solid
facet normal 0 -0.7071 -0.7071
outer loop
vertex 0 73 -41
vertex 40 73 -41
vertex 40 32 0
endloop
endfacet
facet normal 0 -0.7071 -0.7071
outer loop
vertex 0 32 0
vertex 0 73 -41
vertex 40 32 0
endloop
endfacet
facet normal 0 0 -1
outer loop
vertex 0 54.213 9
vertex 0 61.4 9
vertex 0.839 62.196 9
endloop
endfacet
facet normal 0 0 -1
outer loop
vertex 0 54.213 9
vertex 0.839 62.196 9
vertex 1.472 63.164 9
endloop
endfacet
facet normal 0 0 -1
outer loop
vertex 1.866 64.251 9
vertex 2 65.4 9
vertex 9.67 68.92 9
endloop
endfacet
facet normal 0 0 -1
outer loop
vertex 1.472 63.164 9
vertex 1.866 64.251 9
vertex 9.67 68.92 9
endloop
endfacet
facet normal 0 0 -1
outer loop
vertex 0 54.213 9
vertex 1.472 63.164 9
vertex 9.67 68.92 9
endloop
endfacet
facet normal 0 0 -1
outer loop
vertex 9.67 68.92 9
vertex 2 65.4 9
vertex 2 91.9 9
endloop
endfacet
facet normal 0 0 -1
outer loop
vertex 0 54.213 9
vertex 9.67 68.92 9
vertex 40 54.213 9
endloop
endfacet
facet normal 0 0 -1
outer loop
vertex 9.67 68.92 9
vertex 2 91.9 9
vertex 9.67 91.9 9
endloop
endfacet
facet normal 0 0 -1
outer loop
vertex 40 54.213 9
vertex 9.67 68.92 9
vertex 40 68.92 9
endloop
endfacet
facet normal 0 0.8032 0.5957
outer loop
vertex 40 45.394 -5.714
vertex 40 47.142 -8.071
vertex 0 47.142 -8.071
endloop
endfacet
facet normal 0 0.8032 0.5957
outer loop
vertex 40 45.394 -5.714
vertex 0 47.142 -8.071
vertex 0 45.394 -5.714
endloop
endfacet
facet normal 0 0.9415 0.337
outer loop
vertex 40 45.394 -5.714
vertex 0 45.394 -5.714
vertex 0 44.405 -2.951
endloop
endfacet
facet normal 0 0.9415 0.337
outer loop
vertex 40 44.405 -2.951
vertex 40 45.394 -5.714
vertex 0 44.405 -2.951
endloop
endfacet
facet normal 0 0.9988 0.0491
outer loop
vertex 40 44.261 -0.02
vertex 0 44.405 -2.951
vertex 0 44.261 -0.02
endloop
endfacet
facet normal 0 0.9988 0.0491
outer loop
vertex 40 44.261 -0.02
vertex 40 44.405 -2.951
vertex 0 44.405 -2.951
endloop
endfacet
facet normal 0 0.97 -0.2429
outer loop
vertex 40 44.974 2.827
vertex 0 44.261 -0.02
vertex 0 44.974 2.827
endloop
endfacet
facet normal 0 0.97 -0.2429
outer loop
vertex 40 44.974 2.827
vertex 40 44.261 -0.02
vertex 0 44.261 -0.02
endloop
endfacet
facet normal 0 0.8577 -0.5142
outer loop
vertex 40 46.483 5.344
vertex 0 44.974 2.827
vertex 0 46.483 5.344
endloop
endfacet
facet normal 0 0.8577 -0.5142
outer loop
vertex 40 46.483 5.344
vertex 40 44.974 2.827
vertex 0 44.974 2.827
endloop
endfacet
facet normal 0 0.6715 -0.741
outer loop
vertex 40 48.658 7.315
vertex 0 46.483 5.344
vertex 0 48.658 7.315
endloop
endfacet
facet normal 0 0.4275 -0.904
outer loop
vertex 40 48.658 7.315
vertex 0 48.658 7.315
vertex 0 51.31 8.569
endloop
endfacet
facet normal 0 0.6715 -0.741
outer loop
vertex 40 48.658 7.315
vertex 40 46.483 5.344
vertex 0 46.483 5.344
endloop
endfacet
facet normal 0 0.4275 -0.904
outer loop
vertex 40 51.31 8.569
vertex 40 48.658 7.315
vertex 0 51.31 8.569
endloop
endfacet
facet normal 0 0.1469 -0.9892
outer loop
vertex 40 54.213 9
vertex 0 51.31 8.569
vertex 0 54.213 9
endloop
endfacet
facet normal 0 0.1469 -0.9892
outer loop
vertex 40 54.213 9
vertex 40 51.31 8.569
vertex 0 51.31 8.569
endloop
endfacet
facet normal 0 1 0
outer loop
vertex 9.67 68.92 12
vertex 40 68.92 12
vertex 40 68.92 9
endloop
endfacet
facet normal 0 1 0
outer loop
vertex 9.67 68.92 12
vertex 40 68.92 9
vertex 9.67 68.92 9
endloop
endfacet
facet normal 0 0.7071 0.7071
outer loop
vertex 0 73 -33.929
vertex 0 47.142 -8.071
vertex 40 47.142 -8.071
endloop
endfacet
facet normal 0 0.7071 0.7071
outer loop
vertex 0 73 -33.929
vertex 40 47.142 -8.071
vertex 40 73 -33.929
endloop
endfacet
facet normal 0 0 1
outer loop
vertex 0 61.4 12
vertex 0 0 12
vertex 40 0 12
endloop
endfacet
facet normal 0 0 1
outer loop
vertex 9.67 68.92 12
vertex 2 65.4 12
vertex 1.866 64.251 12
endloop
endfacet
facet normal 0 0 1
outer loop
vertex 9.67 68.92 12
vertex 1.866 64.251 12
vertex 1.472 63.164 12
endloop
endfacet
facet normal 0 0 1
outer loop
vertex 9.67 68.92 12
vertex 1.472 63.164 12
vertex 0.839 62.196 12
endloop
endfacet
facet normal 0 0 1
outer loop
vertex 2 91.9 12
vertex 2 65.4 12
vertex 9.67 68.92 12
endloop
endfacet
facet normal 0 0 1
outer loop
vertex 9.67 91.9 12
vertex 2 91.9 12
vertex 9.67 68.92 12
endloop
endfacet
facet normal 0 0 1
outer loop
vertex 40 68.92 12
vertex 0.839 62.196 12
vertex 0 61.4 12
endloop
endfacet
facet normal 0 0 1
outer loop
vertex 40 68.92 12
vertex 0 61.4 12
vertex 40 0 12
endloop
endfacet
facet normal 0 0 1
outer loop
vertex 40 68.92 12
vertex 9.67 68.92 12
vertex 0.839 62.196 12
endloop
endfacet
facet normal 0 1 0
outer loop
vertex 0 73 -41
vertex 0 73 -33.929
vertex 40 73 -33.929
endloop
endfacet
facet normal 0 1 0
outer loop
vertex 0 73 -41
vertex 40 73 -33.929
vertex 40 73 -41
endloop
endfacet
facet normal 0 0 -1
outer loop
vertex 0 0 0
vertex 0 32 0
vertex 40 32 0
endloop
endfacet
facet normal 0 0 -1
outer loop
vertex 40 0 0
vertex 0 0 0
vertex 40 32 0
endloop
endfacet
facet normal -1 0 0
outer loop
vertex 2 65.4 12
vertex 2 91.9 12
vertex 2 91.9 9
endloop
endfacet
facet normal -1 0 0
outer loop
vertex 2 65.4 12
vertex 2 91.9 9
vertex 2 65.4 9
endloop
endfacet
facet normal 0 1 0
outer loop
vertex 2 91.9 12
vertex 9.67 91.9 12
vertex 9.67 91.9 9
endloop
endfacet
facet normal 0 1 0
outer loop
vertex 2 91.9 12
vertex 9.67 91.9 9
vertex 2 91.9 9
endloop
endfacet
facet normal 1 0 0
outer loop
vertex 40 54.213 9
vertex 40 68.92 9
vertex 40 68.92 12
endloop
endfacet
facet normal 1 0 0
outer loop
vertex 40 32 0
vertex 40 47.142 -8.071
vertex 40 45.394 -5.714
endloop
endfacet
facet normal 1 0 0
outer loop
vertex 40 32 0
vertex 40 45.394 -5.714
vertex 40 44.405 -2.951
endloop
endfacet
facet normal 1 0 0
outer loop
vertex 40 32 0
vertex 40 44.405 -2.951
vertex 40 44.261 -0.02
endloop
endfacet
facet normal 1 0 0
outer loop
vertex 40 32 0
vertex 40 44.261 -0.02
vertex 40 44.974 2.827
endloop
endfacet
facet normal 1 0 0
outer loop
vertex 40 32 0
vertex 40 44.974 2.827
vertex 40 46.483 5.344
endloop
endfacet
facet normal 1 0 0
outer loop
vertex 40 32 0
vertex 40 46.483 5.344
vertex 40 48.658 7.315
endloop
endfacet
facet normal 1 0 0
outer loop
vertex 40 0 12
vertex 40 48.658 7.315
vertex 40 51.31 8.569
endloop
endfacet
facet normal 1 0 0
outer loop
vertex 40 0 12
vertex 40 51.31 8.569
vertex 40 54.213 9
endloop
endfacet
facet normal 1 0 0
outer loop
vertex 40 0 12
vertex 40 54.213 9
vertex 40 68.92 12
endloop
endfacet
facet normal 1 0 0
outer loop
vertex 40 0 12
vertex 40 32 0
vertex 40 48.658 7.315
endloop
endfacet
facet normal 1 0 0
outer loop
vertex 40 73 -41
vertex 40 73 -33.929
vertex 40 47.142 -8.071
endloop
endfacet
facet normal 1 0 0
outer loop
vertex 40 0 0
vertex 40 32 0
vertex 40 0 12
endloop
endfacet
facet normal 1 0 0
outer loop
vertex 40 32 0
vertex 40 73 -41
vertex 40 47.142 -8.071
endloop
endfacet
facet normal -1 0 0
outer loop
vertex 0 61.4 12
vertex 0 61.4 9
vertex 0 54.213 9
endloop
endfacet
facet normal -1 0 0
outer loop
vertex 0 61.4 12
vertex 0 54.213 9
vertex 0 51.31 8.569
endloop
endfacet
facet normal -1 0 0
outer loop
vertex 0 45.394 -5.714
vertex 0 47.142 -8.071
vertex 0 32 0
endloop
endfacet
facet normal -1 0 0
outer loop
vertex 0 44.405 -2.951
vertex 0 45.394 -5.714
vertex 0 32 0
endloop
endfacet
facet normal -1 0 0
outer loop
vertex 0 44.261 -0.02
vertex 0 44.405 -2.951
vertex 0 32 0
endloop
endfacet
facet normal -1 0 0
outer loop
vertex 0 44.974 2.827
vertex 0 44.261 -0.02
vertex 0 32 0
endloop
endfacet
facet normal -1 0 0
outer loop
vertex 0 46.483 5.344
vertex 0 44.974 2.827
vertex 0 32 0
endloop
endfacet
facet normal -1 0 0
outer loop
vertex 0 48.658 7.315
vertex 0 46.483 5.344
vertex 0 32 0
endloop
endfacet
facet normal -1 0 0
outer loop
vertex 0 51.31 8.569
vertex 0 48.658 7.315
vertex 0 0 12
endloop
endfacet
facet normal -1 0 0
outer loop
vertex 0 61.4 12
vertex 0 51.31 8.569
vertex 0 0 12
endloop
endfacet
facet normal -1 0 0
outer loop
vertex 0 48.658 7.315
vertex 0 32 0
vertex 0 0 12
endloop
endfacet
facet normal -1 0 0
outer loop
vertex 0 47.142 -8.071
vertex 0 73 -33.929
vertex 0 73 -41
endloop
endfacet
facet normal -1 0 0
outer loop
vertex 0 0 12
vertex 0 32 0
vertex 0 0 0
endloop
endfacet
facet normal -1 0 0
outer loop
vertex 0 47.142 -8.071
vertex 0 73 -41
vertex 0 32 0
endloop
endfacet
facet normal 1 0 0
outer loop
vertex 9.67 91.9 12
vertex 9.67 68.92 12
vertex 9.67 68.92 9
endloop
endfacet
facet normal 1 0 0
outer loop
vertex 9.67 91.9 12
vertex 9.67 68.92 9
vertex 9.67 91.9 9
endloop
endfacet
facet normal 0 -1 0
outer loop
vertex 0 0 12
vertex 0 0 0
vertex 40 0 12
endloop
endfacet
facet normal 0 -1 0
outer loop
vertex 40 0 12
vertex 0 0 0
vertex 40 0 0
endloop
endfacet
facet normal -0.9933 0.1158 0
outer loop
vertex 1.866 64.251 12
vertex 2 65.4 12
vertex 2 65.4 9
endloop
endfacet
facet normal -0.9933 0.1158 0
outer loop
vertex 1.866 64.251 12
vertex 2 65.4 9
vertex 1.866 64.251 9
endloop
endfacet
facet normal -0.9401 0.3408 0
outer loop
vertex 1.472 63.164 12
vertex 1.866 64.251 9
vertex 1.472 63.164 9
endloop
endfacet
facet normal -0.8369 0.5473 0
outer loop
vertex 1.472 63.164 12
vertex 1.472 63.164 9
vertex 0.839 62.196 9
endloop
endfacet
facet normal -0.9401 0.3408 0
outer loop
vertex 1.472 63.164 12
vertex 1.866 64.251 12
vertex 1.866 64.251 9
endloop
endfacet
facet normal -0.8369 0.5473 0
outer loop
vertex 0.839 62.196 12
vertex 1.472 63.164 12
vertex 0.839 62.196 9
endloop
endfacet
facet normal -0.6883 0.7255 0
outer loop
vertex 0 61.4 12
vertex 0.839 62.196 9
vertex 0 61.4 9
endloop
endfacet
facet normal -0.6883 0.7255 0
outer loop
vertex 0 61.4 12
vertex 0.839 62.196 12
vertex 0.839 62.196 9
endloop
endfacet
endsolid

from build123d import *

# Parameters (mm, degrees)
SKETCH_1_W          = 40
SKETCH_1_H          = 32
EXTRUDE_1_DEPTH     = 12
EXTRUDE_2_DEPTH     = 3
FILLET_1_R          = 10
EXTRUDE_3_DEPTH     = 40
FILLET_2_R          = 10
CUT_EXTRUDE_4_DEPTH = 106.156697477
EXTRUDE_4_DEPTH     = 10
EXTRUDE_5_DEPTH     = 10
EXTRUDE_6_DEPTH     = 10
EXTRUDE_7_DEPTH     = 10
FILLET_3_R          = 3
EXTRUDE_8_DEPTH     = 3
SKETCH_11_W         = 29.594040462
SKETCH_11_H         = 15.509477318
CUT_EXTRUDE_5_DEPTH = 125.135450215


with BuildPart() as part:
    # Эскиз1 → Бобышка-Вытянуть1 (new body)
    with BuildSketch(Plane.XY):
        with Locations((20, 16)):
            Rectangle(SKETCH_1_W, SKETCH_1_H)
    extrude(amount=EXTRUDE_1_DEPTH)

    # Эскиз2 → Бобышка-Вытянуть2 (add)
    with BuildSketch(Plane.XY.offset(12)):
        Polygon((40, 68.92), (9.67, 68.92), (9.67, 61.4), (0, 61.4), (0, 32), (9.67, 32), (40, 32), align=None)
    extrude(amount=-EXTRUDE_2_DEPTH)

    # Скругление1
    # the kernel refuses this fillet: 10 mm, written as the material it adds along each edge
    with BuildSketch(Plane(origin=(0, 32, 9), x_dir=(0, 1, 0), z_dir=(1, 0, 0))) as fillet_1_piece_1:
        with BuildLine():
            CenterArc((9.949874371, -10), FILLET_1_R, 90, 84.260829523)
            Line((0, -9), (-0.198997487, -8.98))
            ThreePointArc((-0.198997487, -8.98), (-0.2, -4.5), (-0.2, 0))
            Line((-0.2, 0), (0, 0.2))
            Line((0, 0.2), (9.949874371, 0.2))
            Line((9.949874371, 0.2), (9.949874371, 0))
        make_face()
    extrude(amount=40)

    # Эскиз3 → Бобышка-Вытянуть3 (add)
    with BuildSketch(Plane.ZY):
        Polygon((-50, 82), (0, 32), (0.953231177, 30.366676535), (6.580561568, 32.490506244), (-44.343145751, 83.414213562), align=None)
    extrude(amount=-EXTRUDE_3_DEPTH)

    # Скругление2
    # the kernel refuses this fillet: 10 mm, written as the material it adds along each edge
    with BuildSketch(Plane(origin=(40, 34.002081727, 5.068986084), x_dir=(0, 0.9816056191455192, 0.19091990064406986), z_dir=(-1, 0, 0))) as fillet_2_piece_1:
        with BuildLine():
            CenterArc((18.680660418, 9.816056191), FILLET_2_R, 146.006473408, 135)
            Line((10.389652956, 15.407048525), (9.56055221, 15.966147758))
            Line((9.56055221, 15.966147758), (-0.829100746, 0.559099233))
            Line((-0.829100746, 0.559099233), (-0.66429077, -0.747474262))
            ThreePointArc((-0.66429077, -0.747474262), (8.743026606, -3.322919186), (20.780779325, -0.981605619))
            Line((20.780779325, -0.981605619), (20.589859424, 0))
        make_face()
    extrude(amount=40)

    # Эскиз5 → Вырез-Вытянуть4 (cut, through all)
    with BuildSketch(Plane(origin=(40, 0, 0), x_dir=(0, 0, -1), z_dir=(1, 0, 0))):
        Polygon((50, 82), (39.176517875, 82), (40.76887279, 85.052981815), (48.441128294, 85.535513608), align=None)
    extrude(amount=-CUT_EXTRUDE_4_DEPTH, mode=Mode.SUBTRACT)

    # Эскиз6 → Бобышка-Вытянуть4 (add)
    with BuildSketch(Plane(origin=(40, 0, 0), x_dir=(0, 0, -1), z_dir=(1, 0, 0))):
        Polygon((34.928932188, 74), (42, 74), (50, 82), (42.928932188, 82), align=None)
    extrude(amount=EXTRUDE_4_DEPTH)

    # Эскиз7 → Бобышка-Вытянуть5 (add)
    with BuildSketch(Plane.ZY):
        Polygon((-42, 74), (-34.928932188, 74), (-42.928932188, 82), (-50, 82), align=None)
    extrude(amount=EXTRUDE_5_DEPTH)

    # Эскиз8 → Бобышка-Вытянуть6 (add)
    with BuildSketch(Plane.ZY.offset(10)):
        Polygon((-42, 74), (-58, 74), (-58, 82), (-50, 82), align=None)
    extrude(amount=-EXTRUDE_6_DEPTH)

    # Эскиз9 → Бобышка-Вытянуть7 (add)
    with BuildSketch(Plane(origin=(50, 0, 0), x_dir=(0, 0, -1), z_dir=(1, 0, 0))):
        Polygon((42, 74), (58, 74), (58, 82), (50, 82), align=None)
    extrude(amount=-EXTRUDE_7_DEPTH)

    # Скругление3
    fillet_3_edges = [part.edges().sort_by_distance(p)[0] for p in [
        (0, 78, -46),
        (40, 78, -46),
    ]]
    fillet(fillet_3_edges, radius=FILLET_3_R)

    # Эскиз10 → Бобышка-Вытянуть8 (add)
    with BuildSketch(Plane(origin=(0, 0, 12), x_dir=(-1, 0, 0), z_dir=(0, 0, -1))):
        with BuildLine():
            Line((-9.67, 91.9), (-2, 91.9))
            Line((-2, 91.9), (-2, 65.4))
            ThreePointArc((-2, 65.4), (-1.472135955, 63.163932023), (0, 61.4))
            Line((0, 61.4), (-9.67, 61.4))
            Line((-9.67, 61.4), (-9.67, 91.9))
        make_face()
    extrude(amount=EXTRUDE_8_DEPTH)

    # Эскиз11 → Вырез-Вытянуть5 (cut, through all)
    with BuildSketch(Plane(origin=(50, 0, 0), x_dir=(0, 0, -1), z_dir=(1, 0, 0))):
        with Locations((46.795384827, 80.754738659)):
            Rectangle(SKETCH_11_W, SKETCH_11_H)
    extrude(amount=-CUT_EXTRUDE_5_DEPTH, mode=Mode.SUBTRACT)


solid = part.part
